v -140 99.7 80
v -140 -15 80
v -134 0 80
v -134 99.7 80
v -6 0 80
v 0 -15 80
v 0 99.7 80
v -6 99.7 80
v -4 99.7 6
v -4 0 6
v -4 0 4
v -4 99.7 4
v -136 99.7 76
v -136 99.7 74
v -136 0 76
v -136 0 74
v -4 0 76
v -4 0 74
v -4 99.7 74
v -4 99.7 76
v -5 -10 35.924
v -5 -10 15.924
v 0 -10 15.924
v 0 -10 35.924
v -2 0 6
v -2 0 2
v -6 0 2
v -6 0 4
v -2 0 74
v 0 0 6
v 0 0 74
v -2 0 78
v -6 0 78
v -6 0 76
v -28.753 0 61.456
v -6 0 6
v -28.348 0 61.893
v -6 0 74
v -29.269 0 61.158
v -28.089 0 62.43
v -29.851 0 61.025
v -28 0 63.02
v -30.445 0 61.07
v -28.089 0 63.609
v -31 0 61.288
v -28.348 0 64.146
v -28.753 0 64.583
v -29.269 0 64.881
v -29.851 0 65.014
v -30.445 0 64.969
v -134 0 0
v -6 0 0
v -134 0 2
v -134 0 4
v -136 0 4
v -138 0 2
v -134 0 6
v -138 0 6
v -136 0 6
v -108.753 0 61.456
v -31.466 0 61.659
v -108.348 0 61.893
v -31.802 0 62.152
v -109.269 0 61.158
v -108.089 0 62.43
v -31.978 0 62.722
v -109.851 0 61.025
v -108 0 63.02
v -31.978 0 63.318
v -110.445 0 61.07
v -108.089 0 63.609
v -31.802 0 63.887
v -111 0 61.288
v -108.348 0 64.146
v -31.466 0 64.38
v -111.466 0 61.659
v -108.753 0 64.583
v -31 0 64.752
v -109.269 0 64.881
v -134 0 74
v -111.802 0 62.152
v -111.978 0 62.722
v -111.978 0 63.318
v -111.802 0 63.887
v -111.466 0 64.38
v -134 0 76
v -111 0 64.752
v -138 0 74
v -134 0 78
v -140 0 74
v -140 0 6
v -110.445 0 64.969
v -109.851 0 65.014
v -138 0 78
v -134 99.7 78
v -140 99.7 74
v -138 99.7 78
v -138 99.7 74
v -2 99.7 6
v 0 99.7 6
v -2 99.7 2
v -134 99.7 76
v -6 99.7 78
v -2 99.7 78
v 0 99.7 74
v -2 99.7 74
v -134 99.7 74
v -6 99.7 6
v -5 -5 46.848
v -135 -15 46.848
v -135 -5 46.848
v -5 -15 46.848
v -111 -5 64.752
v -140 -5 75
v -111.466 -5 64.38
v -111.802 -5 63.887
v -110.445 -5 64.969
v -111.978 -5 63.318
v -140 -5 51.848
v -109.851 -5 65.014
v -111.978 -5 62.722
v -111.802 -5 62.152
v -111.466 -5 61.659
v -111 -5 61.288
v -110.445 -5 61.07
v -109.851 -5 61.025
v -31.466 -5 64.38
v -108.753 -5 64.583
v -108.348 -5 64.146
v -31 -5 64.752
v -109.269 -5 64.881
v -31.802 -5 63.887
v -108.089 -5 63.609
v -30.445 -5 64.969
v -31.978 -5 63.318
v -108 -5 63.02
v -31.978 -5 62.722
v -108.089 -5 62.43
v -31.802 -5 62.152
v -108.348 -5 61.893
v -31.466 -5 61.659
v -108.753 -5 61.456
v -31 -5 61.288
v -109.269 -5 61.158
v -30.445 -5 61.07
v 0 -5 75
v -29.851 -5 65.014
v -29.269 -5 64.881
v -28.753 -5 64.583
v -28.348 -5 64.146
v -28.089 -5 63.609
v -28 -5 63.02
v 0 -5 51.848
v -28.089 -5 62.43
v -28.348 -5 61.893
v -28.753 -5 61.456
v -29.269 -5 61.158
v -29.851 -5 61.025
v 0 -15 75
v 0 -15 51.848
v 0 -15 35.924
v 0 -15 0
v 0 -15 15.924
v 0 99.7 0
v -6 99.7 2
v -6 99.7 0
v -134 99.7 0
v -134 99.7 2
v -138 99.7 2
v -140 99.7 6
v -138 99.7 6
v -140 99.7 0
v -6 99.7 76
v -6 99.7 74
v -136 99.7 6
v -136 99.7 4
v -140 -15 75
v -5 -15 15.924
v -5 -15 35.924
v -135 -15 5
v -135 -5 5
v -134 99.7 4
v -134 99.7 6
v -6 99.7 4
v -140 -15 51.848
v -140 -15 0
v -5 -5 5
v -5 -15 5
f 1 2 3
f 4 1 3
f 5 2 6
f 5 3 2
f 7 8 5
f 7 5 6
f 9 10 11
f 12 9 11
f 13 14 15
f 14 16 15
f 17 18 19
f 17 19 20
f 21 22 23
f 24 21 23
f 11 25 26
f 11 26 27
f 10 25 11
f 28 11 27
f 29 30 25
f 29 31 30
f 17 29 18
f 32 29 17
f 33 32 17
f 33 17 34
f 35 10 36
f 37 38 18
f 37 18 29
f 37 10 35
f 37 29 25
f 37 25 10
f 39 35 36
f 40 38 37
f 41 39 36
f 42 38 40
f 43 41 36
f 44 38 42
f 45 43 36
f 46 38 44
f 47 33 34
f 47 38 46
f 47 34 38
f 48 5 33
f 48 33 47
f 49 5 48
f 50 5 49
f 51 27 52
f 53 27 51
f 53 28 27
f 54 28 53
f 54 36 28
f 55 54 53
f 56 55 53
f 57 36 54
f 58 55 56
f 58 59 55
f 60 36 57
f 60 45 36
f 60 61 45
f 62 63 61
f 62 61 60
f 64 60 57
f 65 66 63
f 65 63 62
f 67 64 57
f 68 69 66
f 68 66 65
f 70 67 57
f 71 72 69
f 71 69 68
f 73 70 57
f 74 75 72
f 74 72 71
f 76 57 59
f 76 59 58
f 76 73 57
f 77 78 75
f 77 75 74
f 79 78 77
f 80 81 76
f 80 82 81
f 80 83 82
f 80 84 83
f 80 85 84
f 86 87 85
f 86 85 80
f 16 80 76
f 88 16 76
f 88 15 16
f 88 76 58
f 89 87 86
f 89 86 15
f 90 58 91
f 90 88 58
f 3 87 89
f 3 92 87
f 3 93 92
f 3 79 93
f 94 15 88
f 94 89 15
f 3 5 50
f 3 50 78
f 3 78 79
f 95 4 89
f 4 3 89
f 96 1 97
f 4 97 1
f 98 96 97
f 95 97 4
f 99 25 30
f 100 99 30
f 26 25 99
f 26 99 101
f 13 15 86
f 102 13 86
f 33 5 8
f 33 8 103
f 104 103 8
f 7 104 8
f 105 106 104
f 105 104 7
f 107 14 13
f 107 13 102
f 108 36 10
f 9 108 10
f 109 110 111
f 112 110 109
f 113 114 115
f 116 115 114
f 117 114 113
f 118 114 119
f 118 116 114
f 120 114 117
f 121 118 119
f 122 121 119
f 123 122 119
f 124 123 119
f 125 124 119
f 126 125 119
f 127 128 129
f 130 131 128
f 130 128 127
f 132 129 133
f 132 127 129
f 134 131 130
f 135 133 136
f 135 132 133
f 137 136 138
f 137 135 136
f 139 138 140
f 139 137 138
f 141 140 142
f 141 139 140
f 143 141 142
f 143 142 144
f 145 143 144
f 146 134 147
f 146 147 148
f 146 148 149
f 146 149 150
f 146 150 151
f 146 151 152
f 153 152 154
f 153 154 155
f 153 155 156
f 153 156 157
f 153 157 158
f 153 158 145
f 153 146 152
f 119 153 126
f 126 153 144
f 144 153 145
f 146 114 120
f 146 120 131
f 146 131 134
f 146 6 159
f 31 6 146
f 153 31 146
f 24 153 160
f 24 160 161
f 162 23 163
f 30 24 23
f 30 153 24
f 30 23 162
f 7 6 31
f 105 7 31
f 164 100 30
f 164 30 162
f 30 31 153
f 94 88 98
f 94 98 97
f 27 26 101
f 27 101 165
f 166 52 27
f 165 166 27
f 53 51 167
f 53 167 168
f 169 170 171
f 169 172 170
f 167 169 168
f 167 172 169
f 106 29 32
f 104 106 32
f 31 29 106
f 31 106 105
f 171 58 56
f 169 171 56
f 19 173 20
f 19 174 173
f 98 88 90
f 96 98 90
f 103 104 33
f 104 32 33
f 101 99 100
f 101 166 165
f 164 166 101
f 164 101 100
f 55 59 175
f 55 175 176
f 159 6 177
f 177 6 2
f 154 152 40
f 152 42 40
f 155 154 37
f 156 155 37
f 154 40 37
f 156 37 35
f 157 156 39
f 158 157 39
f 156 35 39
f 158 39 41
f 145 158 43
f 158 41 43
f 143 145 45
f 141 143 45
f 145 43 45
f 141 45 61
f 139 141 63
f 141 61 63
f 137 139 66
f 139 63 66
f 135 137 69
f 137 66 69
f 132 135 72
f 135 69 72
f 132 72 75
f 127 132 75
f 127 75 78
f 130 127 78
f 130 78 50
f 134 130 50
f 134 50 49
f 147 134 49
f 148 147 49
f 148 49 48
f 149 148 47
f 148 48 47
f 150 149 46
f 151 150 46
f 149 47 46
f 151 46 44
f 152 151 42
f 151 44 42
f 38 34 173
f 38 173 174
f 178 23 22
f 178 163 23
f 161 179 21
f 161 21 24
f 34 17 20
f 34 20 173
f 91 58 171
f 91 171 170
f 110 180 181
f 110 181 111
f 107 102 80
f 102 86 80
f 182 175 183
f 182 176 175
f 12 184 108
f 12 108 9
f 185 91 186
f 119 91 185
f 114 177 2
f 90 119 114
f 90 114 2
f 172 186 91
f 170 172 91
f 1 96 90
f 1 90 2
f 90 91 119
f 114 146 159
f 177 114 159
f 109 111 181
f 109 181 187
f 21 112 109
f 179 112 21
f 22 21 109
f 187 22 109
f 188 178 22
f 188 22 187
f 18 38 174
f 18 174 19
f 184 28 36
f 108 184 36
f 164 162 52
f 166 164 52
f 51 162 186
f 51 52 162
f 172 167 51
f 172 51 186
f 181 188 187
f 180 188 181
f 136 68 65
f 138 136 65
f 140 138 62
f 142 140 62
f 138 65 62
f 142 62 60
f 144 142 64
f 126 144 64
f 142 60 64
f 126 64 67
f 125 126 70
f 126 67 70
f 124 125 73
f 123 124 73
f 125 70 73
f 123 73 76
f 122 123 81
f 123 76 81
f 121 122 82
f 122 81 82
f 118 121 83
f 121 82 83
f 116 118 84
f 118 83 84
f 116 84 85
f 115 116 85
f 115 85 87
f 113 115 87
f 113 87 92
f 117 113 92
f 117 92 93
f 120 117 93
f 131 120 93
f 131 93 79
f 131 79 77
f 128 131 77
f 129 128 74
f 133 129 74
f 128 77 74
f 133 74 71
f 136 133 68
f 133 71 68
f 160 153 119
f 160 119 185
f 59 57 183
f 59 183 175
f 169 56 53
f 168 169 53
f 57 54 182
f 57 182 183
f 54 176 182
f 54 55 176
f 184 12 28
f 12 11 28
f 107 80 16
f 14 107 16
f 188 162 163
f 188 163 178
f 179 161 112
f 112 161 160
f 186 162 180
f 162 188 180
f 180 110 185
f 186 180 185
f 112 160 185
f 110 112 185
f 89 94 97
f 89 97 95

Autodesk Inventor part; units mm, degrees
ref_plane "YZ Plane" through (0, 0, 0) normal (1, 0, 0) x (0, 1, 0)
ref_plane "XZ Plane" through (0, 0, 0) normal (0, 1, 0) x (-1, 0, 0)
ref_plane "XY Plane" through (0, 0, 0) normal (0, 0, 1) x (1, 0, 0)
sketch "Sketch1" plane through (0, 0, 0) normal (0, 1, 0) x (-1, 0, 0)
  line L0 (0, 0) -> (140, 0)
  line L1 (140, 0) -> (140, 80)
  line L2 (140, 80) -> (0, 80)
  line L3 (0, 80) -> (0, 0)
  dimension "d0" = 140
  dimension "d1" = 80
extrude "Extrusion2" add sketch "Sketch1" against normal blind 15
sketch "Sketch2" plane through (0, 0, 80) normal (1, 0, 0) x (0, 0, -1)
  line L0 (0, -15) -> (80, -15) projected
  line L1 (5, -5) -> (28.1523, -5)
  line L2 (28.1523, -5) -> (28.1523, -15)
  line L3 (5, -5) -> (5, -15)
  line L4 (80, 0) -> (80, -15) projected
  line L5 (0, 0) -> (0, -15) projected
  line L6 (0, 0) -> (80, 0) projected
  dimension "d6" = 5
  dimension "d7" = 5
  dimension "d8" = 51.8477
extrude "Extrusion3" cut sketch "Sketch2" against normal through all contours L3 L1 L2 L0
sketch "Sketch3" plane through (0, -15, 0) normal (0, -1, 0) x (1, 0, 0)
  line L0 (0, 51.8477) -> (-140, 51.8477) projected
  line L1 (-140, 51.8477) -> (-140, 0) projected
  line L2 (-140, 0) -> (0, 0) projected
  line L3 (0, 0) -> (0, 51.8477) projected
  line L4 (-5, 5) -> (-135, 5)
  line L5 (-135, 5) -> (-135, 46.8477)
  line L6 (-135, 46.8477) -> (-5, 46.8477)
  line L7 (-5, 46.8477) -> (-5, 5)
  dimension "d11" = 5
extrude "Electronics_Housing" cut sketch "Sketch3" against normal blind 10 contours L4 L5 L6 L7
sketch "Sketch4" plane through (0, 0, 0) normal (0, 1, 0) x (1, 0, 0)
  circle A0 centre (-110, -63.0196) radius 2
  line L0 (0, 0) -> (-140, 0) projected
  line L1 (-70, 0) -> (-70, -80) construction
  line L2 (0, -80) -> (-140, -80) projected
  circle A1 centre (-30, -63.0196) radius 2
  dimension "d14" = 40
  dimension "d15" = 4
extrude "M4_Litho_Holder" cut sketch "Sketch4" against normal through all
sketch "Litho_Dimension" plane through (0, 0, 0) normal (0, 1, 0) x (1, 0, 0)
  line L0 (0, 0) -> (-140, 0) projected
  line L1 (-140, 0) -> (-140, -80) projected
  arc A0 (-140, -38.7298) -> (0.3875, -38.0211) centre (-70, 0) ccw construction
  line L2 (-140, -80) -> (0, -80) projected
sketch "Sketch6" plane through (0, -15, 0) normal (0, -1, 0) x (1, 0, 0)
  line L0 (0, 80) -> (0, 0) projected
  line L1 (-5, 46.8477) -> (-5, 5) projected
  line L2 (0, 15.9239) -> (-5, 15.9239)
  line L3 (-5, 15.9239) -> (-5, 35.9239)
  line L4 (-5, 35.9239) -> (0, 35.9239)
  line L5 (0, 35.9239) -> (0, 15.9239)
  line L6 (-140, 0) -> (0, 0) projected
  line L7 (0, 51.8477) -> (-140, 51.8477) projected
  point P0 (0, 35.9239)
  dimension "d18" = 15.9238
  dimension "d19" = 20
  dimension "d20" = 15.9238
extrude "ARd_Nano_Mount" cut sketch "Sketch6" against normal blind 5
sketch "Sketch7" plane through (0, 0, 0) normal (0, 1, 0) x (1, 0, 0)
  line L0 (-140, -80) -> (0, -80) construction
  line L1 (-140, -80) -> (-134, -80)
  line L2 (-134, -80) -> (-134, -74)
  line L3 (-134, -74) -> (-140, -74)
  line L4 (-140, -74) -> (-140, -80)
  line L5 (-140, 0) -> (-140, -80) projected
  line L6 (0, -80) -> (0, 0) projected
  line L7 (-138, -74) -> (-138, -78)
  line L8 (-138, -78) -> (-134, -78)
  line L9 (-136, -74) -> (-136, -76)
  line L10 (-136, -76) -> (-134, -76)
  line L11 (-70, -80) -> (-70, 0) construction
  line L12 (0, 0) -> (-140, 0) projected
  line L13 (-140, -40) -> (0, -40) construction
  line L14 (0, -80) -> (-6, -80)
  line L15 (-6, -80) -> (-6, -74)
  line L16 (-6, -74) -> (0, -74)
  line L17 (0, -74) -> (0, -80)
  line L18 (-2, -74) -> (-2, -78)
  line L19 (-2, -78) -> (-6, -78)
  line L20 (-4, -74) -> (-4, -76)
  line L21 (-4, -76) -> (-6, -76)
  line L22 (-140, 0) -> (-134, 0)
  line L23 (-134, 0) -> (-134, -6)
  line L24 (-134, -6) -> (-140, -6)
  line L25 (-140, -6) -> (-140, 0)
  line L26 (-138, -6) -> (-138, -2)
  line L27 (-138, -2) -> (-134, -2)
  line L28 (-136, -6) -> (-136, -4)
  line L29 (-136, -4) -> (-134, -4)
  line L30 (-6, 0) -> (-6, -6)
  line L31 (-4, -6) -> (-4, -4)
  line L32 (-4, -4) -> (-6, -4)
  line L33 (-2, -6) -> (-2, -2)
  line L34 (0, 0) -> (-6, 0)
  line L35 (-6, -6) -> (0, -6)
  line L36 (0, -6) -> (0, 0)
  line L37 (-2, -2) -> (-6, -2)
  point P0 (0, -6)
  dimension "d27" = 2
  dimension "d29" = 2
  dimension "d30" = 2
extrude "Extrusion7" add sketch "Sketch7" along normal blind 99.7 contours L4 L3 L7 L8 L2 L1 | L6 L14 L15 L19 L18 L16 | L12 L6 L35 L33 L37 L30 | L5 L12 L23 L27 L26 L24 | L10 L9 L3 L2 | L28 L29 L23 L24 | L32 L31 L35 L30 | L20 L21 L15 L16
equation "\"d18\" = d20"
properties part number "NL housing_Main"
